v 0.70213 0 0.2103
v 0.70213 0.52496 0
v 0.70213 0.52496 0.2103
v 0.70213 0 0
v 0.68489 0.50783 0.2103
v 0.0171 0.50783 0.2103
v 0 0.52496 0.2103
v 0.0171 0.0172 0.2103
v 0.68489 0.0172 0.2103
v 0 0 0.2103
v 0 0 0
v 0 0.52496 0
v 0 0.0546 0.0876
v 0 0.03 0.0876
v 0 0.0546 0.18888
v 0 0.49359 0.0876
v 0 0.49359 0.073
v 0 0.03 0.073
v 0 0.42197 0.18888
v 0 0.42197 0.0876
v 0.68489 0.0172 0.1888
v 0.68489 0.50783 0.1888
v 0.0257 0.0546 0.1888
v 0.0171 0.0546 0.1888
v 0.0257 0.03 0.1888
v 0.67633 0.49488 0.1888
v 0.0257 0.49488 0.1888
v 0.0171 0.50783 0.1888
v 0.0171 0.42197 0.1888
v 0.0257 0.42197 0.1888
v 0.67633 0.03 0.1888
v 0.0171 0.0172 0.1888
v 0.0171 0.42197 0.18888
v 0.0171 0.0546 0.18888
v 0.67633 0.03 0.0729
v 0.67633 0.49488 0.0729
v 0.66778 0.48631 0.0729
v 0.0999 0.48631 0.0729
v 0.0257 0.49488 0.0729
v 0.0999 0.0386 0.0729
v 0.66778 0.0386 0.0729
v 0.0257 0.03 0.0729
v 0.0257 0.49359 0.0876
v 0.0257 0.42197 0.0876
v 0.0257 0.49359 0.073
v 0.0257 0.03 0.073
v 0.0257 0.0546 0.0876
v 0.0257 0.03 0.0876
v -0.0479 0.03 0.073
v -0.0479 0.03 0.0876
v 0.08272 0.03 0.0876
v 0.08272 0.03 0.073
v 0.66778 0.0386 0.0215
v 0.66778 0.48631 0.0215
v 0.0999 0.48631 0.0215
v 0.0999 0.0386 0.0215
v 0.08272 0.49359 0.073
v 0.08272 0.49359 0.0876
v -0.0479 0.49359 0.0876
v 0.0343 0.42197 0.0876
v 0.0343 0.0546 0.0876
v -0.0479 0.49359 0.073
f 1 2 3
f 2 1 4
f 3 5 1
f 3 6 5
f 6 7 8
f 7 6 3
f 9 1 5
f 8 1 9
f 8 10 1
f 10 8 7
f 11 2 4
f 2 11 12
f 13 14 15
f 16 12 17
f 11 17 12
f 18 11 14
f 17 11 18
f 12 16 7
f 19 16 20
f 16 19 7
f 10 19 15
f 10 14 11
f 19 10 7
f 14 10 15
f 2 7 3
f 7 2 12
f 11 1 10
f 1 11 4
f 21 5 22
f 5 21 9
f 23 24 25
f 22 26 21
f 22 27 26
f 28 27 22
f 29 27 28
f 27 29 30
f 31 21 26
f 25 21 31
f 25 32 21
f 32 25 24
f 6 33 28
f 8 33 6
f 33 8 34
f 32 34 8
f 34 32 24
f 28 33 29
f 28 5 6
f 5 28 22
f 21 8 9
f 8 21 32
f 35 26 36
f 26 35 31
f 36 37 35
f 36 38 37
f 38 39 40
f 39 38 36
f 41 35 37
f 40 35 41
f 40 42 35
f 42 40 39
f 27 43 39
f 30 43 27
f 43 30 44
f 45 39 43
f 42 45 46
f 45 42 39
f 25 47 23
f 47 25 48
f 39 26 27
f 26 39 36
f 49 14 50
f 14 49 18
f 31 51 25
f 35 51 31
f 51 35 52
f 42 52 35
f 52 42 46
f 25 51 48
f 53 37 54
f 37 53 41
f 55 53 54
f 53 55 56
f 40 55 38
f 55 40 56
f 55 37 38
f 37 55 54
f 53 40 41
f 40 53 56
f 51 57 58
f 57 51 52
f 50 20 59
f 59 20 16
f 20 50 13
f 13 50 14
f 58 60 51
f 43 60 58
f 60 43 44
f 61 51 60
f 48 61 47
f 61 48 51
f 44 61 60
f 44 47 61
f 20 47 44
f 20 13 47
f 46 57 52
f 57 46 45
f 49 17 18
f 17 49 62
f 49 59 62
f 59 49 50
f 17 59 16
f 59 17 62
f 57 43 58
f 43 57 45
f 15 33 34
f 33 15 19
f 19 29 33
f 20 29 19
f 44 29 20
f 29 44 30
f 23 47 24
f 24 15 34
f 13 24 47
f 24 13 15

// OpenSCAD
// Main body dimensions (mm)
body_length = 0.702127;
body_width = 0.524964;
reference_height = 0.210295;
body_height = 0.2103;
epsilon = 0.000001;

// Shallow top recess
top_length = 0.667793;
top_width = 0.490631;
top_left = 0.0171;
top_front = 0.0172;
top_floor = 0.1888;
top_depth = 0.0215;

// Middle pocket
middle_length = 0.650626;
middle_width = 0.46488;
middle_left = 0.0257;
middle_front = 0.03;
middle_floor = 0.0729;
middle_depth = 0.1159;

// Lower offset pocket
lower_length = 0.567882;
lower_width = 0.447713;
lower_left = 0.0999;
lower_front = 0.0386;
lower_floor = 0.0215;
lower_depth = 0.0515;

// Side projection
projection_length = 0.130618;
projection_width = 0.463588;
projection_overhang = 0.0479;
projection_front = 0.03;
projection_bottom = 0.073;
projection_thickness = 0.0146;

// Side recess; upper edge approximately 0.1889
side_cut_depth = 0.0343;
side_face_length = 0.367372;
side_face_height = 0.101285;
side_front = 0.0546;
side_bottom = 0.0876;

// Rectangular pocket cutter
module pocket_cut(length, width, left, front, floor_z, depth) {
    translate([left, front, floor_z])
        cube([length, width, depth + epsilon]);
}

// Main body with three contained pocket levels
module pocketed_body() {
    difference() {
        cube([body_length, body_width, body_height]);

        pocket_cut(
            top_length, top_width,
            top_left, top_front,
            top_floor, top_depth
        );

        pocket_cut(
            middle_length, middle_width,
            middle_left, middle_front,
            middle_floor, middle_depth
        );

        pocket_cut(
            lower_length, lower_width,
            lower_left, lower_front,
            lower_floor, lower_depth
        );
    }
}

// Solid lower side projection
module side_projection() {
    translate([
        -projection_overhang,
        projection_front,
        projection_bottom
    ])
        cube([
            projection_length,
            projection_width,
            projection_thickness
        ]);
}

// Non-through left-side recess
module side_recess() {
    translate([-epsilon, side_front, side_bottom])
        cube([
            side_cut_depth + epsilon,
            side_face_length,
            side_face_height
        ]);
}

// Final solid
module model() {
    difference() {
        union() {
            pocketed_body();
            side_projection();
        }
        side_recess();
    }
}

model();
